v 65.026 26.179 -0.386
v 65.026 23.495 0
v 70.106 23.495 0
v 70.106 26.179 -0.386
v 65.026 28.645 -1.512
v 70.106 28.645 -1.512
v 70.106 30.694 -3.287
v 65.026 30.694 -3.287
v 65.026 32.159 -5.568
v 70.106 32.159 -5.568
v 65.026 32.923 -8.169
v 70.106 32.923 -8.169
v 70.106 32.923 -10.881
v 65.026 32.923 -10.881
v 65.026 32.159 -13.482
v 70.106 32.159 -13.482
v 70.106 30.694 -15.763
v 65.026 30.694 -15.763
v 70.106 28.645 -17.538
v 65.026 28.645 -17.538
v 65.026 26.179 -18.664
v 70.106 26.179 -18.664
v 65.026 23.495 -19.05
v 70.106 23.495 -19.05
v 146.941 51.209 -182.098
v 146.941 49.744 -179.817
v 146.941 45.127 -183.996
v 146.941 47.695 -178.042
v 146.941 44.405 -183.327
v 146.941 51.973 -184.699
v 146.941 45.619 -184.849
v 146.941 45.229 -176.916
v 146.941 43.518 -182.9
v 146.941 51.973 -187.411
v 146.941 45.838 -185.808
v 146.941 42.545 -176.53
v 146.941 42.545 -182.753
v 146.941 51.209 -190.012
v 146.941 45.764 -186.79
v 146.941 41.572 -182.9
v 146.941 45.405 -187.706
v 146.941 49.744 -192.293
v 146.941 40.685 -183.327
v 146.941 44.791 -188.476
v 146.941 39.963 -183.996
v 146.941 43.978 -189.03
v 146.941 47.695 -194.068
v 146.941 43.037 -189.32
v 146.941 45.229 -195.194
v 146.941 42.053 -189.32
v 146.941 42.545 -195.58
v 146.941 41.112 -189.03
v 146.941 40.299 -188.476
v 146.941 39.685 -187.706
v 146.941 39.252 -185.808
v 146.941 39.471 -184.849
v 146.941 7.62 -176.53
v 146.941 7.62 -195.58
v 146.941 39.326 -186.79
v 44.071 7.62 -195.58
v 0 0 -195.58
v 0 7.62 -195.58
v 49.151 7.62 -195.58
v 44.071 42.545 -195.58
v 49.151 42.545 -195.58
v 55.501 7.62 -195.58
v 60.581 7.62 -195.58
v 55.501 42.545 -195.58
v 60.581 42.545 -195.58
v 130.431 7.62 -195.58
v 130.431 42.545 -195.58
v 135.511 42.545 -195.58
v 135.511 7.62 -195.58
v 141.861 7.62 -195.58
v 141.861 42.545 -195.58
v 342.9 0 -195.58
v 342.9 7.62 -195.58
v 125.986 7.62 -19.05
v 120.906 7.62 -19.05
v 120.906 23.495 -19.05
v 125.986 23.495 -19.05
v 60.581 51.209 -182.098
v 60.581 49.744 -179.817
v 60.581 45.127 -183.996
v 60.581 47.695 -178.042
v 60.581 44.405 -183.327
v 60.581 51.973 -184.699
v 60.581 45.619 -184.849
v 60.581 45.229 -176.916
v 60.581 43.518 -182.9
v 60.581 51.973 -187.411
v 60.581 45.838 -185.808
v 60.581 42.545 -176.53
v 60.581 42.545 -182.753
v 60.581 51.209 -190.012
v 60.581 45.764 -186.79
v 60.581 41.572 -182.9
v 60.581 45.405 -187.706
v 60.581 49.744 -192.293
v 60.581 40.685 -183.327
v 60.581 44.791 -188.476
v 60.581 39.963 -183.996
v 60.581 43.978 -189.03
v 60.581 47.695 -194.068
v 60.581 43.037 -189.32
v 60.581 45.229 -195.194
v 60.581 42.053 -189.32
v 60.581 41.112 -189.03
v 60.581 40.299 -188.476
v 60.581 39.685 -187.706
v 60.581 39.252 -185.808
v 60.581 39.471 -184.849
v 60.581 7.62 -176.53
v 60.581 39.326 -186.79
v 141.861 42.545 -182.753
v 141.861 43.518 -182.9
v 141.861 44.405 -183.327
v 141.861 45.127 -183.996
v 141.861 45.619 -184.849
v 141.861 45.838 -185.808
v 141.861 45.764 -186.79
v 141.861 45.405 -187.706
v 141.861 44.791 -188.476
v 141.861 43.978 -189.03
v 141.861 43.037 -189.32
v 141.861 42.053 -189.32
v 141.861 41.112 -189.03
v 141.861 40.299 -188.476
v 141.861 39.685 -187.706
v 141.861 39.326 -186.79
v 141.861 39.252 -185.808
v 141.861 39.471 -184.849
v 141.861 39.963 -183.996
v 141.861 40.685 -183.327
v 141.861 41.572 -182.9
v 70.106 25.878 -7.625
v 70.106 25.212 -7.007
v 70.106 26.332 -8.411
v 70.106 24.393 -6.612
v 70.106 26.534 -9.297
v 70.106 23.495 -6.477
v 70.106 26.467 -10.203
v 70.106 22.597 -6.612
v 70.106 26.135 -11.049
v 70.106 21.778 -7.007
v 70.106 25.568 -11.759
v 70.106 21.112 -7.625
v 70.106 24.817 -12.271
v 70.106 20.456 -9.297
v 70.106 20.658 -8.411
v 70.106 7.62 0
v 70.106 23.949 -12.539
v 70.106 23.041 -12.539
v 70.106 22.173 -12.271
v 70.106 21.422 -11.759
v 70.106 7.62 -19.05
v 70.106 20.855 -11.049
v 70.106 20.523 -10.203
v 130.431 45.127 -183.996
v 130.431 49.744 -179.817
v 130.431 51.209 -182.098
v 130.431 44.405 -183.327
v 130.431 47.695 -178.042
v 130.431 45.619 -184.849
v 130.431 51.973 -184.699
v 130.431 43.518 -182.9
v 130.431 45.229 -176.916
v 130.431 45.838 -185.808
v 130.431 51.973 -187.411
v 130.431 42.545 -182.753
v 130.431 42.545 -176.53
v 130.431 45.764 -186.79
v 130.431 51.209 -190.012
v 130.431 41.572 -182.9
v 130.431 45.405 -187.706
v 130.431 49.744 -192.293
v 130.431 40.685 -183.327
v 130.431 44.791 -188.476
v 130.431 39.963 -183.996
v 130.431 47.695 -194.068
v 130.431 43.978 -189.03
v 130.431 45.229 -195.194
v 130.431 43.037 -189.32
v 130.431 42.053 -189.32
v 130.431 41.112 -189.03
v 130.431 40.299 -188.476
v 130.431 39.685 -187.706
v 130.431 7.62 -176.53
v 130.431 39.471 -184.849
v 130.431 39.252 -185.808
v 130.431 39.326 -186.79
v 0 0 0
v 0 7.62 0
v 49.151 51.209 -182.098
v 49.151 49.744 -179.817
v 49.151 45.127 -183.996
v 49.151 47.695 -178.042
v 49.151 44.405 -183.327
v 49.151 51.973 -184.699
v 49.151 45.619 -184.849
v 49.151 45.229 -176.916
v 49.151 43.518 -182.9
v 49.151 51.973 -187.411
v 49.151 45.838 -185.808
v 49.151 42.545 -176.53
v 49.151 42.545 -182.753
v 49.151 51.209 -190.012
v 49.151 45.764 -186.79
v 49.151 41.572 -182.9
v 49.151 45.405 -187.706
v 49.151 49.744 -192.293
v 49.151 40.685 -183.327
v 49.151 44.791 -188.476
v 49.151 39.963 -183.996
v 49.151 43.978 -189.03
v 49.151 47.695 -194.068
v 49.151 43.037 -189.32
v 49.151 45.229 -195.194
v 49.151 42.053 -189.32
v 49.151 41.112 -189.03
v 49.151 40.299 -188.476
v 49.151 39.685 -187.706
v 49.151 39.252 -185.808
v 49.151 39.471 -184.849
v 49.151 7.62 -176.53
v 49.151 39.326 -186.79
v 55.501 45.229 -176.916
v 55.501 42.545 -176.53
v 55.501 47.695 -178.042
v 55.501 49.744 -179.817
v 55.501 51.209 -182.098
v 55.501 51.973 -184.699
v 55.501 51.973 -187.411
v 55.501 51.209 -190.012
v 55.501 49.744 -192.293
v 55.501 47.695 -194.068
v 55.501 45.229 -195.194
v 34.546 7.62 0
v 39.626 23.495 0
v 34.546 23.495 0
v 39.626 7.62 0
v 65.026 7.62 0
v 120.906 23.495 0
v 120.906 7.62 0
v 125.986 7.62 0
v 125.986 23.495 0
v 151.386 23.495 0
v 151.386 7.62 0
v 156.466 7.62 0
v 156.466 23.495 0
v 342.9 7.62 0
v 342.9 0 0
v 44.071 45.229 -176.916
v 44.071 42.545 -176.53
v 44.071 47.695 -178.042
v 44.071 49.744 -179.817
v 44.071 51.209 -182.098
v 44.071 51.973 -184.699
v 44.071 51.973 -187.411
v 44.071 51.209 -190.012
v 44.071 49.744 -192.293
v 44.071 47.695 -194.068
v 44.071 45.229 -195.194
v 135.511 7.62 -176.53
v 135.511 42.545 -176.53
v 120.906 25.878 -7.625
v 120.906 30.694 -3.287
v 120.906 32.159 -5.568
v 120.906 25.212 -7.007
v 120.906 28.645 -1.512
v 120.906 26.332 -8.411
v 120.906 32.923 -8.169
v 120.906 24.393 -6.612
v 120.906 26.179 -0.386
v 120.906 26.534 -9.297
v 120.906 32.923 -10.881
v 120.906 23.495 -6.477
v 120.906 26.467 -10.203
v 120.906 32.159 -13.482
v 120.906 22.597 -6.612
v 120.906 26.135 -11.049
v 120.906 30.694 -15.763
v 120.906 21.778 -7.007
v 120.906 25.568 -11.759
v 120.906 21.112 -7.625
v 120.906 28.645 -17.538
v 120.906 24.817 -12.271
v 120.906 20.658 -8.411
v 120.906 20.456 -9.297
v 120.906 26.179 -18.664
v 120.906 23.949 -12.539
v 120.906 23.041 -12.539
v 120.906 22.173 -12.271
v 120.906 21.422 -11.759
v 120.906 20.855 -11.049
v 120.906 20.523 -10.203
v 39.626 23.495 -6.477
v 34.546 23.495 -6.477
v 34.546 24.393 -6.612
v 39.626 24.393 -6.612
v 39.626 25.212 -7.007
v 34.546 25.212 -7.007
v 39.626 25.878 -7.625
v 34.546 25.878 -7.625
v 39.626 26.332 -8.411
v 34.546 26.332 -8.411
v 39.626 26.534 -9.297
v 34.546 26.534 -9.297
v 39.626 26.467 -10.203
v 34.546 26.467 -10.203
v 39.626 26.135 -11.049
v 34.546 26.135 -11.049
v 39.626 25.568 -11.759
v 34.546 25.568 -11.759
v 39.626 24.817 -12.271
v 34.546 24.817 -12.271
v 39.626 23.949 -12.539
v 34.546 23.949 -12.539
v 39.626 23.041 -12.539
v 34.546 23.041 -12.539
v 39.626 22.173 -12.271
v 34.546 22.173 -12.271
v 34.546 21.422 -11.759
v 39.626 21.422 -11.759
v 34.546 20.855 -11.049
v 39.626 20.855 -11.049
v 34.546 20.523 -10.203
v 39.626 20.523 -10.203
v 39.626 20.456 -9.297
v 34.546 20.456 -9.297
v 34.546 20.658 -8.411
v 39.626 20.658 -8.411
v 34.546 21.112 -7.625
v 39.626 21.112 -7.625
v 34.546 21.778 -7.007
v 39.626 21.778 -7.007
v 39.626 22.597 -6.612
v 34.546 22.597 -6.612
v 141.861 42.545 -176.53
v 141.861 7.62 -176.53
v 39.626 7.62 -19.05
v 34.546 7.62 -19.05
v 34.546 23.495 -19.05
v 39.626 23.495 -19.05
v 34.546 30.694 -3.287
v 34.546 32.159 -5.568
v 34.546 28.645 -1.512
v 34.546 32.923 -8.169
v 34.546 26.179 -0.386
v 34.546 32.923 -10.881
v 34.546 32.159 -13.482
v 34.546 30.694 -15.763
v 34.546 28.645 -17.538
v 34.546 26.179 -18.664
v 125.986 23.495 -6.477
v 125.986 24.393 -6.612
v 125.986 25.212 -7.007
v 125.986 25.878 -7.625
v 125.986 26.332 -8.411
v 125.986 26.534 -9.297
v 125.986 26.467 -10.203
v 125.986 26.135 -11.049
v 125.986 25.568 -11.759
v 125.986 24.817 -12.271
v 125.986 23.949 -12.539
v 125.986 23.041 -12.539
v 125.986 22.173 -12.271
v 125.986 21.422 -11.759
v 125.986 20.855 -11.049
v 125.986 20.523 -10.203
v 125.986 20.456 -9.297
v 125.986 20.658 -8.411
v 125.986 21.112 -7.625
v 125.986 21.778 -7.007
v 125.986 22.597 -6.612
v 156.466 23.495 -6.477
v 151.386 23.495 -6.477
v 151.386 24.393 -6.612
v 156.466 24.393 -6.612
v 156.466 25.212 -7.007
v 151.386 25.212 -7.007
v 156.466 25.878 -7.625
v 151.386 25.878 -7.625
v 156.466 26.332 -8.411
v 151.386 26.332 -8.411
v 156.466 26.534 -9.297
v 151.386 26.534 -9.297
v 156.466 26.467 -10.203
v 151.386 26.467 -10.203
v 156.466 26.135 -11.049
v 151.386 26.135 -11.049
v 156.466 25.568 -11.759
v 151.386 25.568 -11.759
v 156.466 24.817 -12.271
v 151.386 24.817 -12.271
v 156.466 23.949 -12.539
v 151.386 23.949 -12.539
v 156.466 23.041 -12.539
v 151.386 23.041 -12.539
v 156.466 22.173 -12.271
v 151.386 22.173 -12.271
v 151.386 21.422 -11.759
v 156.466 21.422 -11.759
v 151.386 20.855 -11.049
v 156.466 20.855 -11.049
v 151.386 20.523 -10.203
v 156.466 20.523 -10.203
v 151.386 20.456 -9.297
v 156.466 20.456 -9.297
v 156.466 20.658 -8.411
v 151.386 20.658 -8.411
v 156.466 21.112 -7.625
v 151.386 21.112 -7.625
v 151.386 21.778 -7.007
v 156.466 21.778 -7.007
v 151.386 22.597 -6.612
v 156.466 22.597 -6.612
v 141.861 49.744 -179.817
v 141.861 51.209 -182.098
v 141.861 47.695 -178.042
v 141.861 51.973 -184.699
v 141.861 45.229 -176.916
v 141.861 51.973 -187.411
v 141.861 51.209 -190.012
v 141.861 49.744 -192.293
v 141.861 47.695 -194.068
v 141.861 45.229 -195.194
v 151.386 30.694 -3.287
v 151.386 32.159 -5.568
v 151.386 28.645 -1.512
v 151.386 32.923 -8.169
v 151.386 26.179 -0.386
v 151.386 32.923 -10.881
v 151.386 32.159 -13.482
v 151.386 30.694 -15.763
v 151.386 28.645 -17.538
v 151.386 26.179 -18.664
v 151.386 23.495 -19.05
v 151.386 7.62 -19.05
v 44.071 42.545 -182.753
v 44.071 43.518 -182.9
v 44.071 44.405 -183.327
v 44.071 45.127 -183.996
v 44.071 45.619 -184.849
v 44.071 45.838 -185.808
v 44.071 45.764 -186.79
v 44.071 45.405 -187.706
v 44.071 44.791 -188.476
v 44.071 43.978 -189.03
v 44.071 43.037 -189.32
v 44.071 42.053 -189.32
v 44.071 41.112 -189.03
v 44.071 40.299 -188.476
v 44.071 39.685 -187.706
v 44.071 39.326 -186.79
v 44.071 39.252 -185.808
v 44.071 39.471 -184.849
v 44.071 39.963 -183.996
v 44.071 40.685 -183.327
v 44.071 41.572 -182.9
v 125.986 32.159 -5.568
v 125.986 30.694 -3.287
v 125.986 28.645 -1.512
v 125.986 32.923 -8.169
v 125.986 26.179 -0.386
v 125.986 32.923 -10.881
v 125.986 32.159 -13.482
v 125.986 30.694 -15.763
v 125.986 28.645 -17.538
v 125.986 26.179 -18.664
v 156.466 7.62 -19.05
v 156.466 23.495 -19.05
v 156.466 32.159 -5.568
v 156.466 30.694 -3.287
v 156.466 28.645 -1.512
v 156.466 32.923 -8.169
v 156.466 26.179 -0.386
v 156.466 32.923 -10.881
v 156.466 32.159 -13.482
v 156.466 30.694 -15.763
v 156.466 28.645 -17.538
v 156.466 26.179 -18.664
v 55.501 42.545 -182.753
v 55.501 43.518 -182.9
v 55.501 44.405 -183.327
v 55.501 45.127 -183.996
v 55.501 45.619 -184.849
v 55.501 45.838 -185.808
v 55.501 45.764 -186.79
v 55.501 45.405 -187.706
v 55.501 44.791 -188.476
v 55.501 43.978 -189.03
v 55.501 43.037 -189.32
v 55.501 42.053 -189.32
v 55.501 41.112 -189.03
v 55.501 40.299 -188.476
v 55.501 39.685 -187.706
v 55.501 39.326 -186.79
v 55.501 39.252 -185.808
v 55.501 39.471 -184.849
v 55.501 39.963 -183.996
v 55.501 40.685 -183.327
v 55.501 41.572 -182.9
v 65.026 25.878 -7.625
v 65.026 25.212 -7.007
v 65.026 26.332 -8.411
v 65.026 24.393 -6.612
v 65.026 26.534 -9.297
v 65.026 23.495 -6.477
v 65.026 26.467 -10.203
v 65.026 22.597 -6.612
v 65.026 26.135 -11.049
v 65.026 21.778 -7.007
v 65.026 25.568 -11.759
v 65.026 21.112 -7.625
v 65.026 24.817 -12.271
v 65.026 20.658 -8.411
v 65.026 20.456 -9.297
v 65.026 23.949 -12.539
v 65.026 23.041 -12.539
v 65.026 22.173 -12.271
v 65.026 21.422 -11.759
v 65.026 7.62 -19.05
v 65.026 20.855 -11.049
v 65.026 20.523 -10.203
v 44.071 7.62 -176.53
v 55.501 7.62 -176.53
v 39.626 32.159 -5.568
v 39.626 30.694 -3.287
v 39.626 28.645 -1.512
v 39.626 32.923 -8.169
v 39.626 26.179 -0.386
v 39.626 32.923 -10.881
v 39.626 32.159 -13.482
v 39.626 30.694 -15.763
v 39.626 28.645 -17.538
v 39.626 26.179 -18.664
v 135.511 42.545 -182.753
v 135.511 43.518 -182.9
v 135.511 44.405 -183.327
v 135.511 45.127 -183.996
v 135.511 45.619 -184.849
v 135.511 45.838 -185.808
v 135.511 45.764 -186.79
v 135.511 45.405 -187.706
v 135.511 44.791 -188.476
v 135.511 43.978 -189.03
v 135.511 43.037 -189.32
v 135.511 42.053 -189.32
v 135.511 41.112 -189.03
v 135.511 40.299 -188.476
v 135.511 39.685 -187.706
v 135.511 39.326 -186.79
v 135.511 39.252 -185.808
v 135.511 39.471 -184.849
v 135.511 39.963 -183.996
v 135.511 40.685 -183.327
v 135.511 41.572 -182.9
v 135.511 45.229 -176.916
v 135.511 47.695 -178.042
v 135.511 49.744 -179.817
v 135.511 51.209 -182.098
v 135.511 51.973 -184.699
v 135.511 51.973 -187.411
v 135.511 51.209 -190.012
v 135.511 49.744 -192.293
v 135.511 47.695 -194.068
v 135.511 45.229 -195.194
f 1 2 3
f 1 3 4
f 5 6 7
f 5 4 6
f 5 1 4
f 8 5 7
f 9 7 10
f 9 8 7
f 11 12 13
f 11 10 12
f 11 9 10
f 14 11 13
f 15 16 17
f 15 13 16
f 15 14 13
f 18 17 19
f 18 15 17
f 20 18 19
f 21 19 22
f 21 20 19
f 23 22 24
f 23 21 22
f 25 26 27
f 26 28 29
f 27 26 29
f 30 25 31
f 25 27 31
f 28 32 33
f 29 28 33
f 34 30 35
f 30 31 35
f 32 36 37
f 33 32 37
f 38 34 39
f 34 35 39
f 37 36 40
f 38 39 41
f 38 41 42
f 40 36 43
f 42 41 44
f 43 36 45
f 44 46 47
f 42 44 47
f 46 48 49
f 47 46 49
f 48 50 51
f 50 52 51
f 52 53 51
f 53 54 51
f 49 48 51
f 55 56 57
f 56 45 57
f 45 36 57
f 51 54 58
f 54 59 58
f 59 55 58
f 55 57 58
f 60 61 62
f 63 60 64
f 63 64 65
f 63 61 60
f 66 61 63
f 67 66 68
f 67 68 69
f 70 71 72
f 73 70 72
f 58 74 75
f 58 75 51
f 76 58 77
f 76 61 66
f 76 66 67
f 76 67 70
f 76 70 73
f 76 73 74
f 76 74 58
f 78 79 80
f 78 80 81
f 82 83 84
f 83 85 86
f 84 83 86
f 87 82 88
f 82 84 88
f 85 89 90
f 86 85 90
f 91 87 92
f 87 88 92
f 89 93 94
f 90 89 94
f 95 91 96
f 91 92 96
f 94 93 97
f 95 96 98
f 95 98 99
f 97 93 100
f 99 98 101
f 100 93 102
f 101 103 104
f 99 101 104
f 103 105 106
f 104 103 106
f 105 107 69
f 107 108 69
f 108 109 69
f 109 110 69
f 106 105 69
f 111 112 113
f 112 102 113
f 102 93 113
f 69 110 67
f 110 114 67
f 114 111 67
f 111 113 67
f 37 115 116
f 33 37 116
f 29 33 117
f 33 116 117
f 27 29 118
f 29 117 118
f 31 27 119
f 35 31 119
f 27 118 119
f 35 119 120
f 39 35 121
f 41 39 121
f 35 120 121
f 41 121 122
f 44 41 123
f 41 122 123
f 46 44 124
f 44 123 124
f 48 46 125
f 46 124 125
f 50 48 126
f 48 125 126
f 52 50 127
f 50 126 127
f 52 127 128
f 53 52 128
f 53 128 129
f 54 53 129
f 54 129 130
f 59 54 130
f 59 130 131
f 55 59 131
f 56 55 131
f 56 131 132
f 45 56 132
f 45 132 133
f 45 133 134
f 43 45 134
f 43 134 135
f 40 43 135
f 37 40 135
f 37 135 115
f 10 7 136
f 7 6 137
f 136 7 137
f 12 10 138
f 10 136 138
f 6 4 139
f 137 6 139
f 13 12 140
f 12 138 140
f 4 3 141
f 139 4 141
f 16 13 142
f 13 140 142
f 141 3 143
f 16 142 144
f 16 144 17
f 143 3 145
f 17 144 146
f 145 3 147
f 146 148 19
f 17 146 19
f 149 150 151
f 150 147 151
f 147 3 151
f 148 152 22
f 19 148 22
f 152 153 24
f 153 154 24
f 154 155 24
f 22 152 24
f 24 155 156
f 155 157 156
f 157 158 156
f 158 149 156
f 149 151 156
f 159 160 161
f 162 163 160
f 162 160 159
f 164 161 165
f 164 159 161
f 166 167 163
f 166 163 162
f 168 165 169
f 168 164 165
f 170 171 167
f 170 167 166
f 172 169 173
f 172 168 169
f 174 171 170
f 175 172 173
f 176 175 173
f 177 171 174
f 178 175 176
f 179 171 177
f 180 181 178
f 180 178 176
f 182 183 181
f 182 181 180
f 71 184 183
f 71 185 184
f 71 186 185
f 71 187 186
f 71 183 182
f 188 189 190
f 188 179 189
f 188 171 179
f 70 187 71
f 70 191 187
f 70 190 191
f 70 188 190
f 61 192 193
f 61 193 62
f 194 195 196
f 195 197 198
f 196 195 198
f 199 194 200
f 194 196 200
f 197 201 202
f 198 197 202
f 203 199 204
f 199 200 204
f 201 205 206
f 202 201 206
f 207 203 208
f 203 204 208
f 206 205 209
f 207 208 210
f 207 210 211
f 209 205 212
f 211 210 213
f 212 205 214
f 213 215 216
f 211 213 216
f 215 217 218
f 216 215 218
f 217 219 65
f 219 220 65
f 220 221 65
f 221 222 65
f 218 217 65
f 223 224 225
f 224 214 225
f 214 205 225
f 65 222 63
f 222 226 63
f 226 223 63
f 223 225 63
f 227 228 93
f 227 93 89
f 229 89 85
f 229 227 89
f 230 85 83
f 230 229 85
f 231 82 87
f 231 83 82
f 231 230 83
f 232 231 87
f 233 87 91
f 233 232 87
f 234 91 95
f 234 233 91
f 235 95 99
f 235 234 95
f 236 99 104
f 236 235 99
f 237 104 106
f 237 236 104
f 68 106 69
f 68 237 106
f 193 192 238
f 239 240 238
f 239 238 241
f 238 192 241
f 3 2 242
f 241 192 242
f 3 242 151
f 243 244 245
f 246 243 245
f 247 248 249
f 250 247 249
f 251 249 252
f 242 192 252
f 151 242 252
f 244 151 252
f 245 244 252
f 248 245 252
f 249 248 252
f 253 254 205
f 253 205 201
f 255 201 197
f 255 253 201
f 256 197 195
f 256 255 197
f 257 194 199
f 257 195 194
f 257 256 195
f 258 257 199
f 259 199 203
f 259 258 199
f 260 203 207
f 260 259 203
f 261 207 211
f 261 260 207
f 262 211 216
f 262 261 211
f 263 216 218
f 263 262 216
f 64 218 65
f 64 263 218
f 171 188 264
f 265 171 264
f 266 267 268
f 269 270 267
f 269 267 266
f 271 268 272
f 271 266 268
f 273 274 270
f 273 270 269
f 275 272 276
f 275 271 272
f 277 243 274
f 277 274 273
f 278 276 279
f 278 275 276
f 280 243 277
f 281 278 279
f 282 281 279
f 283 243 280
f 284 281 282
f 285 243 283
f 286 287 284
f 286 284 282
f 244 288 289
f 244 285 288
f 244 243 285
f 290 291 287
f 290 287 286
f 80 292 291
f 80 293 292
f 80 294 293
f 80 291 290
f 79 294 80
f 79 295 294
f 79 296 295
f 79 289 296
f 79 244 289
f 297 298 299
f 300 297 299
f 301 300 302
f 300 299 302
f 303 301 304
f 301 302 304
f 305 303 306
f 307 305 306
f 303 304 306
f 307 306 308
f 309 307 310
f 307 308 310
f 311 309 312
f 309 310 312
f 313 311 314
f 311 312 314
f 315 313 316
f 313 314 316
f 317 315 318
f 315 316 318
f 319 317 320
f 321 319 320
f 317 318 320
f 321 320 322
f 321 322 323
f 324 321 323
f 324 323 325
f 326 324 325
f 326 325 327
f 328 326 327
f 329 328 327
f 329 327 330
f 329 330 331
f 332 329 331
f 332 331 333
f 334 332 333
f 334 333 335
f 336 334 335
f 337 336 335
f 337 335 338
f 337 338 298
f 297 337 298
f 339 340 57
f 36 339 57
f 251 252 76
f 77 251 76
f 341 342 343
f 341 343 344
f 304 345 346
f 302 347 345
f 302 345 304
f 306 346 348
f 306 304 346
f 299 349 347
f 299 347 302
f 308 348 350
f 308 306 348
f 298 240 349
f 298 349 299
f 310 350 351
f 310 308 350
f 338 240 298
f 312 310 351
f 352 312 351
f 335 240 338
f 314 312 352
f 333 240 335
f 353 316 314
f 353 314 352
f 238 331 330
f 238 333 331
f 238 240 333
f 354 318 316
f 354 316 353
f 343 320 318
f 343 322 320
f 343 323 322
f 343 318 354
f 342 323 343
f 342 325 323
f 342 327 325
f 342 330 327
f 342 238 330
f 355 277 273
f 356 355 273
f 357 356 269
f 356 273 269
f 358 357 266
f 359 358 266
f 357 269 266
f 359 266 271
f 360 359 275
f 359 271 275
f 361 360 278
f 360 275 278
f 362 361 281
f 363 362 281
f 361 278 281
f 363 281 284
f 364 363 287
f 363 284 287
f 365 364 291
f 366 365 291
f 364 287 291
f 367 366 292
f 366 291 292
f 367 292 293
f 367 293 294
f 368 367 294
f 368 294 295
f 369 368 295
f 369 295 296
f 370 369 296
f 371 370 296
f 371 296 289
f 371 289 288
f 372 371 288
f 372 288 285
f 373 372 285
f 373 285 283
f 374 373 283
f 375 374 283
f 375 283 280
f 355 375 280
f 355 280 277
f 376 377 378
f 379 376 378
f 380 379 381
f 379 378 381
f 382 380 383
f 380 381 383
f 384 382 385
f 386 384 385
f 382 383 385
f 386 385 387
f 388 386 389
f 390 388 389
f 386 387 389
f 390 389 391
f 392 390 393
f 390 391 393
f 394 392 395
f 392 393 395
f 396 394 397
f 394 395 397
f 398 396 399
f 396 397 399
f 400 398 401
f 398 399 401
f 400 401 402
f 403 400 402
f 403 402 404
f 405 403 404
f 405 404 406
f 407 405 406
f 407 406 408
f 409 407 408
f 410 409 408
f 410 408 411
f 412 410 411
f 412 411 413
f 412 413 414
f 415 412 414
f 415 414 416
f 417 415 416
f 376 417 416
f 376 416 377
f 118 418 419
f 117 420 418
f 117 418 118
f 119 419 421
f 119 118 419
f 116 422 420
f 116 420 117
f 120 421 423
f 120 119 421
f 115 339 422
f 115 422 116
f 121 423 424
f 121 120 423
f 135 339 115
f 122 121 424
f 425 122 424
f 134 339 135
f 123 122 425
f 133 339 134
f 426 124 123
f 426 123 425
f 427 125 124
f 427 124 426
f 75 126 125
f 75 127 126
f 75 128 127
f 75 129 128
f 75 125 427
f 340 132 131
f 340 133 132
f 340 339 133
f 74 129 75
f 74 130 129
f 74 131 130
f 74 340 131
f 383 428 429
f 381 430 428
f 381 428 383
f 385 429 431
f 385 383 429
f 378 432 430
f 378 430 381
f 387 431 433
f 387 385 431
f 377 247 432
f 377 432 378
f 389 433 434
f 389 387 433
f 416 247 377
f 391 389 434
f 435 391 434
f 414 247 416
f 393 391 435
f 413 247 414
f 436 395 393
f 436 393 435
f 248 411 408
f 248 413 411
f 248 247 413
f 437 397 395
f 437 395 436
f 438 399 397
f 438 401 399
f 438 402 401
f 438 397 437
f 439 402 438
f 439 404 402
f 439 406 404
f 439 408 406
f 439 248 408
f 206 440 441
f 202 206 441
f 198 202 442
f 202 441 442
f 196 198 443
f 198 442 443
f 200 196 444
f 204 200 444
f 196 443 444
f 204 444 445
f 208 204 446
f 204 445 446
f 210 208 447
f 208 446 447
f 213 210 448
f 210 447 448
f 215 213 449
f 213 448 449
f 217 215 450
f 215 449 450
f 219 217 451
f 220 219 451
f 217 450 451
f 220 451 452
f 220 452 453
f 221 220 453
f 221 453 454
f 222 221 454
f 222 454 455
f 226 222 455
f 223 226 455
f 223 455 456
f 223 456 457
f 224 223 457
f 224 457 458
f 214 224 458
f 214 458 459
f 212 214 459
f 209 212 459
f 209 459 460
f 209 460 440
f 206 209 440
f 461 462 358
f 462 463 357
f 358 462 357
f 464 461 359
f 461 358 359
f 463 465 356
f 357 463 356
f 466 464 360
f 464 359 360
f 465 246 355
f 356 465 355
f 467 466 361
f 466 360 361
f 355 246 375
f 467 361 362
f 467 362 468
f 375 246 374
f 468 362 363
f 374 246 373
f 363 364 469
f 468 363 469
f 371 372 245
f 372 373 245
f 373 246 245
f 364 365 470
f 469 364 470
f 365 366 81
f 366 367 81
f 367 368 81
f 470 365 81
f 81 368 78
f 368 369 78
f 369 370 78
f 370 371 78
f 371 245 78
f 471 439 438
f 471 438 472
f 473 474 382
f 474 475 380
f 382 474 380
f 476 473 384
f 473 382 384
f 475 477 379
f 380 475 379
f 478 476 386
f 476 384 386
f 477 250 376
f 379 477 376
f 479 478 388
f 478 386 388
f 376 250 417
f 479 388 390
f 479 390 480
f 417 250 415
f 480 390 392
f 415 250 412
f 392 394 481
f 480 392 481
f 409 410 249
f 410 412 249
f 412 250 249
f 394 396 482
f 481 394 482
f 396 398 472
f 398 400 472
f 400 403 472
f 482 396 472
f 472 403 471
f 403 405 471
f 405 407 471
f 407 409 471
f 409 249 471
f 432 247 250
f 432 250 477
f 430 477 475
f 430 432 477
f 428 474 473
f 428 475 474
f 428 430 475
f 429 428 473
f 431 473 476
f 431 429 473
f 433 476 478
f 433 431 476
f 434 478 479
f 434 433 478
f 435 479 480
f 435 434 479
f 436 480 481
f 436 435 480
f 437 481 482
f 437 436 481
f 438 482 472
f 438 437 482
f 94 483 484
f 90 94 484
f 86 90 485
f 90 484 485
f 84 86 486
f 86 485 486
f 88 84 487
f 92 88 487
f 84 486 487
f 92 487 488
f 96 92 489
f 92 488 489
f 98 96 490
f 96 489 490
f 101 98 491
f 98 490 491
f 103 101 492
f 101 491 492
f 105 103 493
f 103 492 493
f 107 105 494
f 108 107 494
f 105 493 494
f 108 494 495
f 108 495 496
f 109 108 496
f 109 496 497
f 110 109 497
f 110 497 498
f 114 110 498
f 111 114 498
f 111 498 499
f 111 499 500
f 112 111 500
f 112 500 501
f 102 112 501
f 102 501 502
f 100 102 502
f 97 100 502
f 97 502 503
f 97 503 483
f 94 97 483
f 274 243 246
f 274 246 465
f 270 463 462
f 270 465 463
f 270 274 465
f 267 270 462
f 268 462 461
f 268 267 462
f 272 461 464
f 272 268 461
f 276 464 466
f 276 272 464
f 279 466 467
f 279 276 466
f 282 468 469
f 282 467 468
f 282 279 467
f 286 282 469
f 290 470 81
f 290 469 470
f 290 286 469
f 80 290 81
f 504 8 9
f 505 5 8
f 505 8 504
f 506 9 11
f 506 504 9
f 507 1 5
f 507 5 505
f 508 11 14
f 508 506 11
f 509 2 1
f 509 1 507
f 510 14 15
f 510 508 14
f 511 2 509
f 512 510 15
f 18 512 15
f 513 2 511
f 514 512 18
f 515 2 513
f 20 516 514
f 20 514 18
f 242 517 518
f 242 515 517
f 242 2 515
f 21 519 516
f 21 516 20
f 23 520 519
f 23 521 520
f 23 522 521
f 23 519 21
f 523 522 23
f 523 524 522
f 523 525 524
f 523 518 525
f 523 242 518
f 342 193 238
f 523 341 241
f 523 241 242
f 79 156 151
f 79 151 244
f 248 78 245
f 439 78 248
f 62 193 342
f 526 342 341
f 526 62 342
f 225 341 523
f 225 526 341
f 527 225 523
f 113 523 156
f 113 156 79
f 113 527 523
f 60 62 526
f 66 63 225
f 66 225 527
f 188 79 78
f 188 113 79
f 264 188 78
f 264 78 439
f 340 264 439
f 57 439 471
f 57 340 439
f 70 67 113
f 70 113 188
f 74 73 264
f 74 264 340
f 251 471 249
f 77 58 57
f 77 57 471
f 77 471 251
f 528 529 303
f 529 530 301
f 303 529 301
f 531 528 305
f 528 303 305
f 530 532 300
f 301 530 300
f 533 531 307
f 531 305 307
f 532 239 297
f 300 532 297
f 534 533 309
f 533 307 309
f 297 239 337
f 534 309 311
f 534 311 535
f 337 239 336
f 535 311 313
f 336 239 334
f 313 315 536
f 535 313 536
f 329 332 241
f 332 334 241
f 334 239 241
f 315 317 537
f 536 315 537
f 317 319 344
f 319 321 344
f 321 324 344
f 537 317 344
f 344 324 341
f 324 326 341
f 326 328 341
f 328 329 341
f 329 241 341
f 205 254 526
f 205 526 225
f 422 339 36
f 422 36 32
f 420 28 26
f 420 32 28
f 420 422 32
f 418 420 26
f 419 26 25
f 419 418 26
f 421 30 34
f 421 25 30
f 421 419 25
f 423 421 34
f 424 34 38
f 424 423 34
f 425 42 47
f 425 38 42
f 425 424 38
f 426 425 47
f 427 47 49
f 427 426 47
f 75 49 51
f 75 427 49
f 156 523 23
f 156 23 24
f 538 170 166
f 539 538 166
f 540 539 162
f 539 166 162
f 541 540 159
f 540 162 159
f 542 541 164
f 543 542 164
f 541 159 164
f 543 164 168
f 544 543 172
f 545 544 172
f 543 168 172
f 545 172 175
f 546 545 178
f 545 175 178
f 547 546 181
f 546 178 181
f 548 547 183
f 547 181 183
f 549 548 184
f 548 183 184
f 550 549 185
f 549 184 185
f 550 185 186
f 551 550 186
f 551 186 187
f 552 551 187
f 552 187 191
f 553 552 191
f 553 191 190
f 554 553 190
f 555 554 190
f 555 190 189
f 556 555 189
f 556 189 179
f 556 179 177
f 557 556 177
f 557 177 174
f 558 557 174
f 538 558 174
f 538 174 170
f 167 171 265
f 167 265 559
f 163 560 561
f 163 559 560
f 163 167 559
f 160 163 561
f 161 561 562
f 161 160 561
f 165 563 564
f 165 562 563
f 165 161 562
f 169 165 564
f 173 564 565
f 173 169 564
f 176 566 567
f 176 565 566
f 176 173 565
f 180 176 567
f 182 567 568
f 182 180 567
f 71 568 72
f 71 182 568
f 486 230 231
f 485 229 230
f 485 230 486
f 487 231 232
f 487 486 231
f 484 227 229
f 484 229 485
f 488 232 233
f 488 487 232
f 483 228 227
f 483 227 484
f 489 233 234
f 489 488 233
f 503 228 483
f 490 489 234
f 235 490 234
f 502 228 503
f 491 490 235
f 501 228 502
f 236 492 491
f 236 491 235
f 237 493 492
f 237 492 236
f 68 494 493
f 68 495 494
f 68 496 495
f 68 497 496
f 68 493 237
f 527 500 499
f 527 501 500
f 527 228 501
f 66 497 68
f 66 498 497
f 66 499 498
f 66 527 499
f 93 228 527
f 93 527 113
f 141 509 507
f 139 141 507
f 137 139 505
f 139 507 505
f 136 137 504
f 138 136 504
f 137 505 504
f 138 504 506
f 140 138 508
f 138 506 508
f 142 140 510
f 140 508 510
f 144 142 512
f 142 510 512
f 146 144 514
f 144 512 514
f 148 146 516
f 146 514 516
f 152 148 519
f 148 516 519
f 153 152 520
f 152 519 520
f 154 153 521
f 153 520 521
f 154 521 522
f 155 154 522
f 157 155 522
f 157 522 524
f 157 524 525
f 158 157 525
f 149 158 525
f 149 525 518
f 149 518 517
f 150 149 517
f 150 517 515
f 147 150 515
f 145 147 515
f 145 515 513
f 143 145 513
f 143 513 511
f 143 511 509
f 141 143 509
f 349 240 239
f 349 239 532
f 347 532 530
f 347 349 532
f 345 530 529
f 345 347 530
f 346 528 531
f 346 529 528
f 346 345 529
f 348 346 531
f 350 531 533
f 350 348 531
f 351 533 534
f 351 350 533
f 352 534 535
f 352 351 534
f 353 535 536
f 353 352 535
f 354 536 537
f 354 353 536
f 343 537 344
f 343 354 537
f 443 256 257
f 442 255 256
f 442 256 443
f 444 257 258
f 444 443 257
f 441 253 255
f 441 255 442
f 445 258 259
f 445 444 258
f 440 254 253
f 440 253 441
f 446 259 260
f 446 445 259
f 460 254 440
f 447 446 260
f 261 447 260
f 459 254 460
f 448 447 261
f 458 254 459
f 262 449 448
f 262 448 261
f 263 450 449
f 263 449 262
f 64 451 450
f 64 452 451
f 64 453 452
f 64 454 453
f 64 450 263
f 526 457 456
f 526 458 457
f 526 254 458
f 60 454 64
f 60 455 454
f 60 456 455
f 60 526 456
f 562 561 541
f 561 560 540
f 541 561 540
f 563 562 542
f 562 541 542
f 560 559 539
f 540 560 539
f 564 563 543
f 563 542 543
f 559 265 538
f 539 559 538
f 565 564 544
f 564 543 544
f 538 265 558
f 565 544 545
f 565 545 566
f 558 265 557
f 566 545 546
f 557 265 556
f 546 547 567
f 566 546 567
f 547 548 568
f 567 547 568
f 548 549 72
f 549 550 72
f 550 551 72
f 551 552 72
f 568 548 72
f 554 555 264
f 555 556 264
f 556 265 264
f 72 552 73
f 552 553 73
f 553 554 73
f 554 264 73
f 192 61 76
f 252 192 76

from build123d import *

# Parameters (mm, degrees)
SKETCH1_W           = 342.9
SKETCH1_H           = 195.58
BOSS_EXTRUDE1_DEPTH = 7.62
SKETCH2_W           = 5.08
SKETCH2_H           = 19.05
BOSS_EXTRUDE2_DEPTH = 25.4
SKETCH3_R           = 3.048
CUT_EXTRUDE1_DEPTH  = 309.353685576
SKETCH2_4_W         = 5.08
SKETCH2_4_H         = 19.05
BOSS_EXTRUDE3_DEPTH = 44.45
SKETCH4_R           = 3.302
CUT_EXTRUDE2_DEPTH  = 299.828685576


with BuildPart() as part:
    # Sketch1 → Boss-Extrude1 (new body)
    with BuildSketch(Plane(origin=(0, 0, 0), x_dir=(1, 0, 0), z_dir=(0, 1, 0))):
        with Locations((171.45, 97.79)):
            Rectangle(SKETCH1_W, SKETCH1_H)
    extrude(amount=BOSS_EXTRUDE1_DEPTH)

    # Sketch2 → Boss-Extrude2 (add)
    with BuildSketch(Plane(origin=(0, 7.62, 0), x_dir=(1, 0, 0), z_dir=(0, 1, 0))):
        with Locations((37.086314424, 9.525)):
            Rectangle(SKETCH2_W, SKETCH2_H)
        with Locations((67.566314424, 9.525)):
            Rectangle(SKETCH2_W, SKETCH2_H)
        with Locations((153.926314424, 9.525)):
            Rectangle(SKETCH2_W, SKETCH2_H)
        with Locations((123.446314424, 9.525)):
            Rectangle(SKETCH2_W, SKETCH2_H)
    extrude(amount=BOSS_EXTRUDE2_DEPTH)

    # Sketch3 → Cut-Extrude1 (cut, through all)
    with BuildSketch(Plane.ZY.offset(-34.546314424)):
        with Locations((-9.525, 23.495)):
            Circle(SKETCH3_R)
        with BuildLine():
            Line((-19.05, 23.495), (-20.422011891, 33.02))
            Line((-20.422011891, 33.02), (2.969055393, 35.880507904))
            Line((2.969055393, 35.880507904), (0, 23.495))
            ThreePointArc((0, 23.495), (-9.525, 33.02), (-19.05, 23.495))
        make_face()
    extrude(amount=-CUT_EXTRUDE1_DEPTH, mode=Mode.SUBTRACT)

    # Sketch2<4> → Boss-Extrude3 (add)
    with BuildSketch(Plane(origin=(0, 7.62, 0), x_dir=(1, 0, 0), z_dir=(0, 1, 0))):
        with Locations((46.611314424, 186.055)):
            Rectangle(SKETCH2_4_W, SKETCH2_4_H)
        with Locations((58.041314424, 186.055)):
            Rectangle(SKETCH2_4_W, SKETCH2_4_H)
        with Locations((144.401314424, 186.055)):
            Rectangle(SKETCH2_4_W, SKETCH2_4_H)
        with Locations((132.971314424, 186.055)):
            Rectangle(SKETCH2_4_W, SKETCH2_4_H)
    extrude(amount=BOSS_EXTRUDE3_DEPTH)

    # Sketch4 → Cut-Extrude2 (cut, through all)
    with BuildSketch(Plane.ZY.offset(-44.071314424)):
        with Locations((-186.055, 42.545)):
            Circle(SKETCH4_R)
        with BuildLine():
            Line((-195.58, 42.545), (-197.59428292, 55.074082425))
            Line((-197.59428292, 55.074082425), (-172.116639762, 54.451508438))
            Line((-172.116639762, 54.451508438), (-176.53, 42.545))
            ThreePointArc((-176.53, 42.545), (-186.055, 52.07), (-195.58, 42.545))
        make_face()
    extrude(amount=-CUT_EXTRUDE2_DEPTH, mode=Mode.SUBTRACT)


solid = part.part
